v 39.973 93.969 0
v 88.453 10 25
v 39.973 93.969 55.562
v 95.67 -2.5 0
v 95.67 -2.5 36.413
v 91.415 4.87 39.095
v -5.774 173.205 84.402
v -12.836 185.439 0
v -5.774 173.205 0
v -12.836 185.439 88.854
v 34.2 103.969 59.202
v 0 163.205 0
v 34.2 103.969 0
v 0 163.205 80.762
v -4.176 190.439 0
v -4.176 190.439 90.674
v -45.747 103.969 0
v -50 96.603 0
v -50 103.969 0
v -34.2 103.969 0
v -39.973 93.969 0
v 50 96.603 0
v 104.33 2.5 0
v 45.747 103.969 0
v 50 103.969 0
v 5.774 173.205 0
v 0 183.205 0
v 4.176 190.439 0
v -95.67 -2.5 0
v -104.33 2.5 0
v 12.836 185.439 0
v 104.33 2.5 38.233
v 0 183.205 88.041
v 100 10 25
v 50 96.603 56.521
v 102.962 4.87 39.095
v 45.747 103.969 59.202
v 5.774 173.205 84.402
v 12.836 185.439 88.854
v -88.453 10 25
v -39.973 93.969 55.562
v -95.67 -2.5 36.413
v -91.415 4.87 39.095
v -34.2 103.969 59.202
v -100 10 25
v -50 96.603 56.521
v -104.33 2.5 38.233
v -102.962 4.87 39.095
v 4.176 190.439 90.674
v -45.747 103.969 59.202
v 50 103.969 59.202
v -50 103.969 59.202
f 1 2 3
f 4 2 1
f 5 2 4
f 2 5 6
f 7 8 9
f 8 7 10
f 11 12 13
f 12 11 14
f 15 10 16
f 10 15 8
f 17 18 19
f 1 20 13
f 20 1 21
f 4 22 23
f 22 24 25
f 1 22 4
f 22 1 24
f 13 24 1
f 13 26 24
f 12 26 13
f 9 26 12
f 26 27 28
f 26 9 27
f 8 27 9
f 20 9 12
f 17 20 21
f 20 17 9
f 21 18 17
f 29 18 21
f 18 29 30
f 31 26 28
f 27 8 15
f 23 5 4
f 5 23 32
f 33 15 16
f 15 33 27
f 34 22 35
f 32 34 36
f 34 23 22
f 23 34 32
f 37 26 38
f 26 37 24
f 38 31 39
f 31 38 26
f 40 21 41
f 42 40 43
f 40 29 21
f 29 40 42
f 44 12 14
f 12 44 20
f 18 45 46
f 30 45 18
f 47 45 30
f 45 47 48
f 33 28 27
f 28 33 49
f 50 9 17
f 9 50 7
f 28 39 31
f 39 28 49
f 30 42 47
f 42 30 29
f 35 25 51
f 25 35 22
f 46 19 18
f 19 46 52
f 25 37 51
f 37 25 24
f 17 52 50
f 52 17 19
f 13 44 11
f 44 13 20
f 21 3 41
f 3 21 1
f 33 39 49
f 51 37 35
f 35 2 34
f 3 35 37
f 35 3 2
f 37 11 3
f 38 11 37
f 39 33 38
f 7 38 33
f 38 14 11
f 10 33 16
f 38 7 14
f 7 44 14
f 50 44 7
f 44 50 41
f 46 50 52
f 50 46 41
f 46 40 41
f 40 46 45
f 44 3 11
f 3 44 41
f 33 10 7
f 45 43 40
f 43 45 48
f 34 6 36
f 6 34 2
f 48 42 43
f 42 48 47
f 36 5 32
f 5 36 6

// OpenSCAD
laptop_dim = [300, 200, 15]; // Laptop dimensions
laptop_angle = 20; // Angle of the laptop stand
leg_angle = 30; // Angle between the legs
leg_distance = 100; // Distance between the legs (somewhere)
raise = 25; // How much to raise the laptop
push = 10; // How much to push the laptop away
thickness = 10; // Thickness of the legs

stand_leg_depth = cos(laptop_angle) * laptop_dim.y / cos(leg_angle);
stand_leg_height = sin(laptop_angle) * laptop_dim.y + raise;


module laptop() {
    // color("grey")
    translate([-laptop_dim.x / 2, 0, 0])
        cube(laptop_dim);
}

module laptop_free_space() {
    free_space = [
        laptop_dim.x,
        laptop_dim.y * 2,
        100,
    ];

    union() {
        translate([-laptop_dim.x / 2, 0, 0])
            cube(free_space);

        translate([-laptop_dim.x / 2, -laptop_dim.z, laptop_dim.z])
            cube(free_space);
    }
}

module stand_leg() {
    translate([-thickness / 2, 0, 0])
        cube([thickness, stand_leg_depth, stand_leg_height]);
}

module stand_plank() {
    translate([- leg_distance / 2, 0, 0])
        cube([leg_distance, thickness, stand_leg_height]);
}

module stand() {
    difference() {
        union() {
            translate([leg_distance, 0, 0])
            rotate([0, 0, leg_angle])
                stand_leg();

            translate([-leg_distance, 0, 0])
            rotate([0, 0, -leg_angle])
                stand_leg();

            translate([0, cos(laptop_angle) * laptop_dim.y / 2, 0])
                stand_plank();
        }

        translate([0, push, raise])
        rotate([laptop_angle, 0, 0])
            laptop_free_space();
    }
}

module assembly() {
    translate([0, push, raise])
    rotate([laptop_angle, 0, 0])
        %laptop();

    stand();
}

assembly();
